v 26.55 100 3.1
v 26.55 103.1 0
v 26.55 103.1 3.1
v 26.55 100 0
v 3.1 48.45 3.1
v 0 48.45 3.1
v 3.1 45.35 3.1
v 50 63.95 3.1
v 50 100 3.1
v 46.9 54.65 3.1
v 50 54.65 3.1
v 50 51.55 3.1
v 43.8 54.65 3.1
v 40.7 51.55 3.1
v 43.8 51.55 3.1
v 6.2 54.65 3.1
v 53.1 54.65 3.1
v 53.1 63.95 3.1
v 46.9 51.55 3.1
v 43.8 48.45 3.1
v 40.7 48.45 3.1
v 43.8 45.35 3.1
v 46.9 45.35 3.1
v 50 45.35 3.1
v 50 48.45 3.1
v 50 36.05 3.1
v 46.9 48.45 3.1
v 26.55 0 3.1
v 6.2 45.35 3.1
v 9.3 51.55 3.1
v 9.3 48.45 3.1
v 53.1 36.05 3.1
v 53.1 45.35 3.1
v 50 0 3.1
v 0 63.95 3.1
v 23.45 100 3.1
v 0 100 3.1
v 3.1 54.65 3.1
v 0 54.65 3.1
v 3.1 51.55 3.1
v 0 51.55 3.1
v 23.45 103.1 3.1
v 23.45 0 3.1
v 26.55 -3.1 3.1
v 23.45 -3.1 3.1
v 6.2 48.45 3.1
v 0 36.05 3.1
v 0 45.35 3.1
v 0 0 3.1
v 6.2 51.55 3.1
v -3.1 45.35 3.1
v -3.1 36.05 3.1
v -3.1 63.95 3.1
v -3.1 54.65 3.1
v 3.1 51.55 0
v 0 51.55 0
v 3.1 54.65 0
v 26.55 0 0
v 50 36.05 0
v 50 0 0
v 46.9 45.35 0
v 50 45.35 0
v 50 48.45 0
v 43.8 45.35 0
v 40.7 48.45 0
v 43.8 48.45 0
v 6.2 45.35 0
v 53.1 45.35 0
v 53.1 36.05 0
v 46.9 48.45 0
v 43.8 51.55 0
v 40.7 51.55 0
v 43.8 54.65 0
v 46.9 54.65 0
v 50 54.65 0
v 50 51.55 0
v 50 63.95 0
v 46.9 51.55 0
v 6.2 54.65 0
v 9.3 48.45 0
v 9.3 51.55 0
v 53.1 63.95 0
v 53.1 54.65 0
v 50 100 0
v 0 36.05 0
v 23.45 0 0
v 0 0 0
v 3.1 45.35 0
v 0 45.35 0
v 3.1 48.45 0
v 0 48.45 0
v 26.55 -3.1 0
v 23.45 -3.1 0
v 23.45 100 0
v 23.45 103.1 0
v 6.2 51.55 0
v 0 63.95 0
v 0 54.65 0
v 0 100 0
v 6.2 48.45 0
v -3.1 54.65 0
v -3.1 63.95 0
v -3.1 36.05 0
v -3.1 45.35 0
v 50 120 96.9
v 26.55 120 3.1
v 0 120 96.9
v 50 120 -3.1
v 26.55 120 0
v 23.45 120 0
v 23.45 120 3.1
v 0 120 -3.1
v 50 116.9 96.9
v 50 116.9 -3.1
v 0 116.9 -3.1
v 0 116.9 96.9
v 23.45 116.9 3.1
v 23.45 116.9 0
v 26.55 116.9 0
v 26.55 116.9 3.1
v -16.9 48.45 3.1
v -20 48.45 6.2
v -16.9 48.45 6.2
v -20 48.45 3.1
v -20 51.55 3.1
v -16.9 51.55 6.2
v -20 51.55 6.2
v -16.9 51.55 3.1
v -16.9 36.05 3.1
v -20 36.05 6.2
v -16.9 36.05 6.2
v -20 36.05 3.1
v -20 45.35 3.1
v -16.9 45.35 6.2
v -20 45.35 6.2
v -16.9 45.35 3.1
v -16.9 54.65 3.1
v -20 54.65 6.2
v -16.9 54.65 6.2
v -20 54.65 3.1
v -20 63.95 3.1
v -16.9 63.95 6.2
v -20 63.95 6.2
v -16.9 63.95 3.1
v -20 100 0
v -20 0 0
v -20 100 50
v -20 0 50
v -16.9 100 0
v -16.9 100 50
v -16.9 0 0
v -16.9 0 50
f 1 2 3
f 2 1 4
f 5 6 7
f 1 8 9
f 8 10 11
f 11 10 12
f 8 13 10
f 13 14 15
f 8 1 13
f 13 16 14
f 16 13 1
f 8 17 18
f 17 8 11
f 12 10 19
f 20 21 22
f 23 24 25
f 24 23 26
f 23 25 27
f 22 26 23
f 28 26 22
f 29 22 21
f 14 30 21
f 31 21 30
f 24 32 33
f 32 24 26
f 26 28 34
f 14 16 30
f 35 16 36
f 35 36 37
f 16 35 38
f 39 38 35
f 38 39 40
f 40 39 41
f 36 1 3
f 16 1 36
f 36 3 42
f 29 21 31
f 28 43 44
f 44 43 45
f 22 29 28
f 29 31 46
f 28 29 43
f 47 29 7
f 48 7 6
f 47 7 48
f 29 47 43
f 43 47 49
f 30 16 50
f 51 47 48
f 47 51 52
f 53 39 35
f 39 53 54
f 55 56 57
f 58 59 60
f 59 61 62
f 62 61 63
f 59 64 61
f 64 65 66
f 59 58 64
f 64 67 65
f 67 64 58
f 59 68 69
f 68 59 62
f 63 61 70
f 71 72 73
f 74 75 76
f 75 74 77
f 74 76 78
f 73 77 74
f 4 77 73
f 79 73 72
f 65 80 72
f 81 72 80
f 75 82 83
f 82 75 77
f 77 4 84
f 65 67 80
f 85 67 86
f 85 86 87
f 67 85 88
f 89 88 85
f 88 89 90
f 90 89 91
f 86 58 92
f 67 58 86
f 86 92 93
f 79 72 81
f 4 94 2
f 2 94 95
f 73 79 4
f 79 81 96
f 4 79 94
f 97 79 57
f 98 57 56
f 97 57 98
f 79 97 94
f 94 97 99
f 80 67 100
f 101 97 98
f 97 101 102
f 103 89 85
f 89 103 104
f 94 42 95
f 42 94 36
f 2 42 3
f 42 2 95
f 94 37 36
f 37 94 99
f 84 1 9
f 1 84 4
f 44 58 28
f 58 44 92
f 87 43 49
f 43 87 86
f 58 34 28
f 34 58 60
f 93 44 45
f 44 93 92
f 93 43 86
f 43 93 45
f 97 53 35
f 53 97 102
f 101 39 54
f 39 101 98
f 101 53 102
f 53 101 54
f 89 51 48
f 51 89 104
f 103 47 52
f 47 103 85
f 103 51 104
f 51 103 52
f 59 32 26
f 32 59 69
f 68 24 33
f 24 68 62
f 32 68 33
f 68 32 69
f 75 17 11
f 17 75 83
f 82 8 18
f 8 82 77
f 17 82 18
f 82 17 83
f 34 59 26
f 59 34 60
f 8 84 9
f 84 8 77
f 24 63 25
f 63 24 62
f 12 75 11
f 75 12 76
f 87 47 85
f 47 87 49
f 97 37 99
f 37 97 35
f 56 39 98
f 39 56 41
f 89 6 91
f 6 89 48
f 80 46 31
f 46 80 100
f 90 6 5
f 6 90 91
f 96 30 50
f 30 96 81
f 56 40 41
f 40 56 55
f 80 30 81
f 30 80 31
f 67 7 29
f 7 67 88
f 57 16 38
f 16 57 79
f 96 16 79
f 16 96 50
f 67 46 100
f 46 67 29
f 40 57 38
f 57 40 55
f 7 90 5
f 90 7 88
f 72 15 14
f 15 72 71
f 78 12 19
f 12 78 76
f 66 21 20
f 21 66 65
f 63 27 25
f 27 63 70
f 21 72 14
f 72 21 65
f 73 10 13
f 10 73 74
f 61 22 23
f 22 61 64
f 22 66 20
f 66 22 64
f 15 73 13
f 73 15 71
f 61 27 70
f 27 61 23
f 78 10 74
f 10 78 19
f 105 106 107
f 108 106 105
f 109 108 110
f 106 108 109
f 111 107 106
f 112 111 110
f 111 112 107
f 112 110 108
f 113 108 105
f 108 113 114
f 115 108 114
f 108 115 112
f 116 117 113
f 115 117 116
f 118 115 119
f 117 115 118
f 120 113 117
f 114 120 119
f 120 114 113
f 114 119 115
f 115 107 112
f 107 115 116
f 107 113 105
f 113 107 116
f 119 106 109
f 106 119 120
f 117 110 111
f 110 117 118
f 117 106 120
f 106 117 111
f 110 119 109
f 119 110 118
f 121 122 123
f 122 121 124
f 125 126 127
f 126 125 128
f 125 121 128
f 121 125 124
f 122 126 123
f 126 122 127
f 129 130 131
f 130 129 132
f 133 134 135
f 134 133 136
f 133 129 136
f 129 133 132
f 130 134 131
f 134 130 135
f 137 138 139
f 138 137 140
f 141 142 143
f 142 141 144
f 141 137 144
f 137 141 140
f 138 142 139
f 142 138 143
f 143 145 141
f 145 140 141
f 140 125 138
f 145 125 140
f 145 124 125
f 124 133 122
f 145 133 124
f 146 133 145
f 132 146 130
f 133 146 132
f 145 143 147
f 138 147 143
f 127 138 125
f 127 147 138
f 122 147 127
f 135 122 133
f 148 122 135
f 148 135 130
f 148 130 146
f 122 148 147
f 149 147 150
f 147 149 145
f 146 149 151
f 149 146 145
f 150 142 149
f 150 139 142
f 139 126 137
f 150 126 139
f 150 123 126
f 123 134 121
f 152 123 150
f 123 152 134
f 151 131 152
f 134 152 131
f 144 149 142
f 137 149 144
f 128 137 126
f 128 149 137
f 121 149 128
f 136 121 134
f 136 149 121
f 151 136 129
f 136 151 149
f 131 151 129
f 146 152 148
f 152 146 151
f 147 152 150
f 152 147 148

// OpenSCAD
include <../lasercut.scad>; 

thickness = 3.1;
x = 50;
y = 100;
lasercutoutSquare(thickness=thickness, x=x, y=y,
    simple_tabs=[
            [UP, x/2, y],
            [DOWN, x/2, 0]
        ],
    captive_nuts=[
            [LEFT, 0, y/2],
            [RIGHT, x, y/2],
            
            ]
);

translate([0,y+20,-thickness]) rotate([90,0,0]) 
    lasercutoutSquare(thickness=thickness, x=x, y=y,
        simple_tab_holes=[
                [MID, x/2-thickness/2, thickness]
            ]
    );

translate([-20,0,0]) rotate([90,0,90]) 
    lasercutoutSquare(thickness=thickness, x=y, y=x,
        captive_nut_holes=[
                [DOWN, y/2, 0]
            ]
    );
